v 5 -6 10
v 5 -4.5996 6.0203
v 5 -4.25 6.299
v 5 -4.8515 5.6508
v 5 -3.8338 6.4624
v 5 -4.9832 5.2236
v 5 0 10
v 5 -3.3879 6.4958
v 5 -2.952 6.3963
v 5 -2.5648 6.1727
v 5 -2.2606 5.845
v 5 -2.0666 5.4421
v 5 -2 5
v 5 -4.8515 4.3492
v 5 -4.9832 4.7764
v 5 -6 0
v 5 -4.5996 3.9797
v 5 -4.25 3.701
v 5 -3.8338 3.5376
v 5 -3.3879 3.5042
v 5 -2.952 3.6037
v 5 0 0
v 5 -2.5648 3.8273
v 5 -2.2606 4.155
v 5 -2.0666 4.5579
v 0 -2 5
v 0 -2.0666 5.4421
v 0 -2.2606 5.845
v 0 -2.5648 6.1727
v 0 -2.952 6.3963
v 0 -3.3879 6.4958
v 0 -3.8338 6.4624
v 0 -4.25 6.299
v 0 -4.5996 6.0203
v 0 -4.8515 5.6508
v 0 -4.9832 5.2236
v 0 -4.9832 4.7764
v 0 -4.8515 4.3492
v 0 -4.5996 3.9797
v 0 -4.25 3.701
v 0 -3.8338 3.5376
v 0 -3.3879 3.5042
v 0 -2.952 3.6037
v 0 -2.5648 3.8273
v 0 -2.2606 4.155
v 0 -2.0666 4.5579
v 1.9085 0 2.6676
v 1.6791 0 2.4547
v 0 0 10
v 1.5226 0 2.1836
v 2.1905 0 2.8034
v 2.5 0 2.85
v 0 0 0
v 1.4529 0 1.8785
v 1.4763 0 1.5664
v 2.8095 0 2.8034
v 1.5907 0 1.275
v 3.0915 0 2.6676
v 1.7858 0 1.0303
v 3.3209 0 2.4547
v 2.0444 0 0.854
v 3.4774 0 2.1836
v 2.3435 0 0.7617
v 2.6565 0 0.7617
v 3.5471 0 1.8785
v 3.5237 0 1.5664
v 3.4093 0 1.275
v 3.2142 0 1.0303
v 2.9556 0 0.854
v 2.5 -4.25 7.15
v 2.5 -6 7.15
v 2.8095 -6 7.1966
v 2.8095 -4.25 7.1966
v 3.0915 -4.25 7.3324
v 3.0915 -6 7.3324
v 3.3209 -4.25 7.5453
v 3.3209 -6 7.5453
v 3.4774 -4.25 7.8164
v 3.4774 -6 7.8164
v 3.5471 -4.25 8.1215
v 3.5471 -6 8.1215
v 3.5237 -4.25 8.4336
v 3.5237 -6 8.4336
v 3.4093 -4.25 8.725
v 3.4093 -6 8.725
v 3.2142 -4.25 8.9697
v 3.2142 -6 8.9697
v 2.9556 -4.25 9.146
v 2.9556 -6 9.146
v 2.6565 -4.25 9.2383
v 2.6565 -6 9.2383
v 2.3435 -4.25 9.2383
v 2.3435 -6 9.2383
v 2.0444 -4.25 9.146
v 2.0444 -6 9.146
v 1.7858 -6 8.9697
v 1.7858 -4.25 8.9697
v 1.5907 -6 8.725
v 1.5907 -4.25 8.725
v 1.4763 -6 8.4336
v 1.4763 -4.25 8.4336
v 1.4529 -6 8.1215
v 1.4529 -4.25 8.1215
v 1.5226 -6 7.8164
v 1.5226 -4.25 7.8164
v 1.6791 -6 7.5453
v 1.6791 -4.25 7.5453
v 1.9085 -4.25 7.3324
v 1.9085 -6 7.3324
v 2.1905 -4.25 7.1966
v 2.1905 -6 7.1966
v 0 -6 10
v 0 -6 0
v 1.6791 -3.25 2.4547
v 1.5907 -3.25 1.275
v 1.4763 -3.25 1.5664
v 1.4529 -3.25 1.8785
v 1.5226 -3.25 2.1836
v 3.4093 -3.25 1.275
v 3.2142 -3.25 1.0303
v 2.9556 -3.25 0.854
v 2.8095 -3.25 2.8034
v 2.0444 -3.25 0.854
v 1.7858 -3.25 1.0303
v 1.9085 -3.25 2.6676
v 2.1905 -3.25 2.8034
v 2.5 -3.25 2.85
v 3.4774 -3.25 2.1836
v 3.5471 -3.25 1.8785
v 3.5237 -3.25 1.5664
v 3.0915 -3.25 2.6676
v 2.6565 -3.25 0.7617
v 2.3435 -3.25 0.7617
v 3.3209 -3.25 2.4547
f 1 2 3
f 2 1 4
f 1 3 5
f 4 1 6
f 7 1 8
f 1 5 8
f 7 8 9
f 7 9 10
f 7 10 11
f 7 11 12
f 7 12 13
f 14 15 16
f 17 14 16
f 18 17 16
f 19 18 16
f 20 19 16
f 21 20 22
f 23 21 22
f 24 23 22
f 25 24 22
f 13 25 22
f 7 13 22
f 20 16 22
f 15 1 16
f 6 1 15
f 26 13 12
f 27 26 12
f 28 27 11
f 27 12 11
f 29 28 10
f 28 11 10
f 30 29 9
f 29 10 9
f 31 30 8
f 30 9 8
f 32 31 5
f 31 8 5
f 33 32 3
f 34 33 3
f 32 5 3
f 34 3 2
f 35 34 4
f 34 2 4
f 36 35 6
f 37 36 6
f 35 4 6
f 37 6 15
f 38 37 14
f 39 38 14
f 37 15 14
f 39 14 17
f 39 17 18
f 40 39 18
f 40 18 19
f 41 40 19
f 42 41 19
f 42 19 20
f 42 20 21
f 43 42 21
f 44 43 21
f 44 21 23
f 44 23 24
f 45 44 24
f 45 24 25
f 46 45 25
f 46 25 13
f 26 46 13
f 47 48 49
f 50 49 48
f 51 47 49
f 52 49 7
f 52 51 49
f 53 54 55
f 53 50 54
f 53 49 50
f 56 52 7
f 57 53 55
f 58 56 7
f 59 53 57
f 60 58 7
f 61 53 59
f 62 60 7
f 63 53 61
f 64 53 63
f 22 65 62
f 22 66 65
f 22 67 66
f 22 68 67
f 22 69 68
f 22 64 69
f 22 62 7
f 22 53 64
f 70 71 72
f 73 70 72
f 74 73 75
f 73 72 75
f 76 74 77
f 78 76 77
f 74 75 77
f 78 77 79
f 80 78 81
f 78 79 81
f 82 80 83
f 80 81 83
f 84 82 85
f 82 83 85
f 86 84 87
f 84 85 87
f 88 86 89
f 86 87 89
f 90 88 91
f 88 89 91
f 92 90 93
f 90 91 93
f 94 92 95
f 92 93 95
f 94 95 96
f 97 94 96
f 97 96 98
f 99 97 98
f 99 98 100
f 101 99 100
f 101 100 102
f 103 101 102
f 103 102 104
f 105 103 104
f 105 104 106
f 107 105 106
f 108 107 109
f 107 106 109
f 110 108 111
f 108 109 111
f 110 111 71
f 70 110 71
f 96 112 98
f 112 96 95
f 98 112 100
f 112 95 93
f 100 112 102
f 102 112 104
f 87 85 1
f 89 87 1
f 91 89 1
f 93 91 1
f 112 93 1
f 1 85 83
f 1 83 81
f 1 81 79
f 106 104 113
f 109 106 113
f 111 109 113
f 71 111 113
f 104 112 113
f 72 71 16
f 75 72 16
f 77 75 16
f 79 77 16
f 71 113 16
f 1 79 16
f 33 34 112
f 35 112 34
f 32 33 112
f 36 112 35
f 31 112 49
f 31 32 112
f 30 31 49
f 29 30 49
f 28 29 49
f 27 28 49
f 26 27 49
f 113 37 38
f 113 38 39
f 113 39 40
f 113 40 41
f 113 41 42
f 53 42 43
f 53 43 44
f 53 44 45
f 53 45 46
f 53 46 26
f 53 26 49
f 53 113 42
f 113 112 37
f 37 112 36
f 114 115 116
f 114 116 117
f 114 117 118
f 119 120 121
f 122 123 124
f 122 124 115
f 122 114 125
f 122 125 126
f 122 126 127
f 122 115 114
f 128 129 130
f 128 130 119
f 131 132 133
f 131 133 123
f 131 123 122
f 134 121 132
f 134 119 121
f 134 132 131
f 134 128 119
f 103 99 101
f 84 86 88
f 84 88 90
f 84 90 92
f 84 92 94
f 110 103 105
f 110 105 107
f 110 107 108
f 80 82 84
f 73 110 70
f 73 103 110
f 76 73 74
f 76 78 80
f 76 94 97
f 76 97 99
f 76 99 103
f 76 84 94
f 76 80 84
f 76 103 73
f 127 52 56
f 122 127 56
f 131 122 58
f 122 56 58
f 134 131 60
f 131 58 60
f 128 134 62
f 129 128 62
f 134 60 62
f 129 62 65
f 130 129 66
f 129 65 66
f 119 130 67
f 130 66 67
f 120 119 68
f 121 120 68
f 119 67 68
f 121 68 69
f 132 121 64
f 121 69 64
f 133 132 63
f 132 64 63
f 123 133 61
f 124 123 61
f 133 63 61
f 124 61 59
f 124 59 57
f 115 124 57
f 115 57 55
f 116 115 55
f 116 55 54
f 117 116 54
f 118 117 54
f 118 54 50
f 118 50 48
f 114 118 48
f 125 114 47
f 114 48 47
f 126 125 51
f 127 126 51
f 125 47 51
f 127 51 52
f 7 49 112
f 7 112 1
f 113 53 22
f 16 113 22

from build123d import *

# Parameters (mm, degrees)
SKETCH1_W           = 5
SKETCH1_H           = 6
BOSS_EXTRUDE1_DEPTH = 10
CUT_EXTRUDE1_REACH  = 14.689
SKETCH2_R           = 1.5
SKETCH3_R           = 1.05
CUT_EXTRUDE2_DEPTH  = 3.25
SKETCH4_R           = 1.05
CUT_EXTRUDE3_DEPTH  = 1.75


with BuildPart() as part:
    # Sketch1 → Boss-Extrude1 (new body)
    with BuildSketch(Plane.XY):
        with Locations((2.5, -3)):
            Rectangle(SKETCH1_W, SKETCH1_H)
    extrude(amount=BOSS_EXTRUDE1_DEPTH)

    # Sketch2 → Cut-Extrude1 (cut, up to next)
    with BuildSketch(Plane(origin=(5, 0, 0), x_dir=(0, 0, -1), z_dir=(1, 0, 0)), mode=Mode.PRIVATE) as cut_extrude1_sk1:
        with Locations(Location((-5, -3.5, 0), (0, 0, 90))):
            Circle(SKETCH2_R)
    cut_extrude1_tool1 = extrude(cut_extrude1_sk1.sketch, amount=-CUT_EXTRUDE1_REACH, mode=Mode.PRIVATE) & part.part
    add(cut_extrude1_tool1.solids().sort_by_distance((5, -3.5, 5))[0], mode=Mode.SUBTRACT)

    # Sketch3 → Cut-Extrude2 (cut)
    with BuildSketch(Plane(origin=(0, 0, 0), x_dir=(1, 0, 0), z_dir=(0, 1, 0))):
        with Locations(Location((2.5, -1.8, 0), (0, 0, 270))):
            Circle(SKETCH3_R)
    extrude(amount=-CUT_EXTRUDE2_DEPTH, mode=Mode.SUBTRACT)

    # Sketch4 → Cut-Extrude3 (cut)
    with BuildSketch(Plane.XZ.offset(6)):
        with Locations(Location((2.5, 8.2, 0), (0, 0, 270))):
            Circle(SKETCH4_R)
    extrude(amount=-CUT_EXTRUDE3_DEPTH, mode=Mode.SUBTRACT)


solid = part.part
